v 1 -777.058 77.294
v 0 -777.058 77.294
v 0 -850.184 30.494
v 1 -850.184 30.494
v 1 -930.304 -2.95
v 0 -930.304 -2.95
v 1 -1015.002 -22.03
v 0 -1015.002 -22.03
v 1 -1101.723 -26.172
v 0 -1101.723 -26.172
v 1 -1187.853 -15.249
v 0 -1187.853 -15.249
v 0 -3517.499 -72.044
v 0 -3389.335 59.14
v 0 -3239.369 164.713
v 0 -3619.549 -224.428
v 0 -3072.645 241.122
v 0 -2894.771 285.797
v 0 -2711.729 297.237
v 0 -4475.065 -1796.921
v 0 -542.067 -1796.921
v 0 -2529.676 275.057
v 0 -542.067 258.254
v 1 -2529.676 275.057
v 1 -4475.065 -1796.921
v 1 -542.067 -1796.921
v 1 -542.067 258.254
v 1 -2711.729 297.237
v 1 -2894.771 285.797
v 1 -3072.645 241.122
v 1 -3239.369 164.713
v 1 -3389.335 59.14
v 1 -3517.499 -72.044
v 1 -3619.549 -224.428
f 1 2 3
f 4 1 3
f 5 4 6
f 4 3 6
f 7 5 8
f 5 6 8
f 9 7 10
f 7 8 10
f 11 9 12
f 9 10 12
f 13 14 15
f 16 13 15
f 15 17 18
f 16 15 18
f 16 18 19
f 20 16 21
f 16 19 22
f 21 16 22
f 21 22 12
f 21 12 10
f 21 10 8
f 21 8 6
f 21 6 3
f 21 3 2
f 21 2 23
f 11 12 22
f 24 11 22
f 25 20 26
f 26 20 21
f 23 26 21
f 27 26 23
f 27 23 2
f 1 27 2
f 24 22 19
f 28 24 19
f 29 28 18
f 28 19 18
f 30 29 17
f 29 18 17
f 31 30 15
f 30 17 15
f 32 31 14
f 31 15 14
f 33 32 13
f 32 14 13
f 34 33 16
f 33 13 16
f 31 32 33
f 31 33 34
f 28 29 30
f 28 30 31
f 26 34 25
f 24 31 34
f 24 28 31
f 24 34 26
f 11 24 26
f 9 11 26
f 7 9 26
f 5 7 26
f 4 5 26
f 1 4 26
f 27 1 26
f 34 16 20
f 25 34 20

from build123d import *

# Parameters (mm, degrees)
F1_DEPTH = 1
F2_W     = 3225.491882
F2_H     = 2943.848134
F3_DEPTH = 1000


with BuildPart() as f1:
    # F0 (on Right) → F1 (new body)
    with BuildSketch(Plane.YZ):
        with BuildLine():
            Line((-3619.548968, -224.428496), (-4475.064898, -1796.920513))
            Line((-4475.064898, -1796.920513), (-25.064898, -1796.920513))
            Line((-25.064898, -1796.920513), (-25.064898, 277.382151))
            Line((-25.064898, 277.382151), (974.935102, 277.382151))
            Line((974.935102, 277.382151), (974.935102, -1796.920513))
            Line((974.935102, -1796.920513), (2424.935102, -1796.920513))
            Line((2424.935102, -1796.920513), (2424.935102, -362.4883))
            Line((2424.935102, -362.4883), (1982.259828, -186.180527))
            ThreePointArc((1982.259828, -186.180527), (1895.679419, -133.217027), (1831.714223, -54.41504))
            Line((1831.714223, -54.41504), (1558.403102, 432.061794))
            ThreePointArc((1558.403102, 432.061794), (886.565338, 922.050269), (76.44219, 734.553146))
            Line((76.44219, 734.553146), (-777.057597, 77.293825))
            ThreePointArc((-777.057597, 77.293825), (-972.237984, -14.33178), (-1187.852902, -15.249356))
            Line((-1187.852902, -15.249356), (-2529.676211, 275.056589))
            ThreePointArc((-2529.676211, 275.056589), (-3157.762827, 206.74725), (-3619.548968, -224.428496))
        make_face()
    extrude(amount=F1_DEPTH)

    # F2 (on face) → F3 (cut)
    with BuildSketch(Plane.YZ.offset(1)):
        with Locations((1070.679009, -398.968339)):
            Rectangle(F2_W, F2_H)
    extrude(amount=-F3_DEPTH, mode=Mode.SUBTRACT)


solid = f1.part
